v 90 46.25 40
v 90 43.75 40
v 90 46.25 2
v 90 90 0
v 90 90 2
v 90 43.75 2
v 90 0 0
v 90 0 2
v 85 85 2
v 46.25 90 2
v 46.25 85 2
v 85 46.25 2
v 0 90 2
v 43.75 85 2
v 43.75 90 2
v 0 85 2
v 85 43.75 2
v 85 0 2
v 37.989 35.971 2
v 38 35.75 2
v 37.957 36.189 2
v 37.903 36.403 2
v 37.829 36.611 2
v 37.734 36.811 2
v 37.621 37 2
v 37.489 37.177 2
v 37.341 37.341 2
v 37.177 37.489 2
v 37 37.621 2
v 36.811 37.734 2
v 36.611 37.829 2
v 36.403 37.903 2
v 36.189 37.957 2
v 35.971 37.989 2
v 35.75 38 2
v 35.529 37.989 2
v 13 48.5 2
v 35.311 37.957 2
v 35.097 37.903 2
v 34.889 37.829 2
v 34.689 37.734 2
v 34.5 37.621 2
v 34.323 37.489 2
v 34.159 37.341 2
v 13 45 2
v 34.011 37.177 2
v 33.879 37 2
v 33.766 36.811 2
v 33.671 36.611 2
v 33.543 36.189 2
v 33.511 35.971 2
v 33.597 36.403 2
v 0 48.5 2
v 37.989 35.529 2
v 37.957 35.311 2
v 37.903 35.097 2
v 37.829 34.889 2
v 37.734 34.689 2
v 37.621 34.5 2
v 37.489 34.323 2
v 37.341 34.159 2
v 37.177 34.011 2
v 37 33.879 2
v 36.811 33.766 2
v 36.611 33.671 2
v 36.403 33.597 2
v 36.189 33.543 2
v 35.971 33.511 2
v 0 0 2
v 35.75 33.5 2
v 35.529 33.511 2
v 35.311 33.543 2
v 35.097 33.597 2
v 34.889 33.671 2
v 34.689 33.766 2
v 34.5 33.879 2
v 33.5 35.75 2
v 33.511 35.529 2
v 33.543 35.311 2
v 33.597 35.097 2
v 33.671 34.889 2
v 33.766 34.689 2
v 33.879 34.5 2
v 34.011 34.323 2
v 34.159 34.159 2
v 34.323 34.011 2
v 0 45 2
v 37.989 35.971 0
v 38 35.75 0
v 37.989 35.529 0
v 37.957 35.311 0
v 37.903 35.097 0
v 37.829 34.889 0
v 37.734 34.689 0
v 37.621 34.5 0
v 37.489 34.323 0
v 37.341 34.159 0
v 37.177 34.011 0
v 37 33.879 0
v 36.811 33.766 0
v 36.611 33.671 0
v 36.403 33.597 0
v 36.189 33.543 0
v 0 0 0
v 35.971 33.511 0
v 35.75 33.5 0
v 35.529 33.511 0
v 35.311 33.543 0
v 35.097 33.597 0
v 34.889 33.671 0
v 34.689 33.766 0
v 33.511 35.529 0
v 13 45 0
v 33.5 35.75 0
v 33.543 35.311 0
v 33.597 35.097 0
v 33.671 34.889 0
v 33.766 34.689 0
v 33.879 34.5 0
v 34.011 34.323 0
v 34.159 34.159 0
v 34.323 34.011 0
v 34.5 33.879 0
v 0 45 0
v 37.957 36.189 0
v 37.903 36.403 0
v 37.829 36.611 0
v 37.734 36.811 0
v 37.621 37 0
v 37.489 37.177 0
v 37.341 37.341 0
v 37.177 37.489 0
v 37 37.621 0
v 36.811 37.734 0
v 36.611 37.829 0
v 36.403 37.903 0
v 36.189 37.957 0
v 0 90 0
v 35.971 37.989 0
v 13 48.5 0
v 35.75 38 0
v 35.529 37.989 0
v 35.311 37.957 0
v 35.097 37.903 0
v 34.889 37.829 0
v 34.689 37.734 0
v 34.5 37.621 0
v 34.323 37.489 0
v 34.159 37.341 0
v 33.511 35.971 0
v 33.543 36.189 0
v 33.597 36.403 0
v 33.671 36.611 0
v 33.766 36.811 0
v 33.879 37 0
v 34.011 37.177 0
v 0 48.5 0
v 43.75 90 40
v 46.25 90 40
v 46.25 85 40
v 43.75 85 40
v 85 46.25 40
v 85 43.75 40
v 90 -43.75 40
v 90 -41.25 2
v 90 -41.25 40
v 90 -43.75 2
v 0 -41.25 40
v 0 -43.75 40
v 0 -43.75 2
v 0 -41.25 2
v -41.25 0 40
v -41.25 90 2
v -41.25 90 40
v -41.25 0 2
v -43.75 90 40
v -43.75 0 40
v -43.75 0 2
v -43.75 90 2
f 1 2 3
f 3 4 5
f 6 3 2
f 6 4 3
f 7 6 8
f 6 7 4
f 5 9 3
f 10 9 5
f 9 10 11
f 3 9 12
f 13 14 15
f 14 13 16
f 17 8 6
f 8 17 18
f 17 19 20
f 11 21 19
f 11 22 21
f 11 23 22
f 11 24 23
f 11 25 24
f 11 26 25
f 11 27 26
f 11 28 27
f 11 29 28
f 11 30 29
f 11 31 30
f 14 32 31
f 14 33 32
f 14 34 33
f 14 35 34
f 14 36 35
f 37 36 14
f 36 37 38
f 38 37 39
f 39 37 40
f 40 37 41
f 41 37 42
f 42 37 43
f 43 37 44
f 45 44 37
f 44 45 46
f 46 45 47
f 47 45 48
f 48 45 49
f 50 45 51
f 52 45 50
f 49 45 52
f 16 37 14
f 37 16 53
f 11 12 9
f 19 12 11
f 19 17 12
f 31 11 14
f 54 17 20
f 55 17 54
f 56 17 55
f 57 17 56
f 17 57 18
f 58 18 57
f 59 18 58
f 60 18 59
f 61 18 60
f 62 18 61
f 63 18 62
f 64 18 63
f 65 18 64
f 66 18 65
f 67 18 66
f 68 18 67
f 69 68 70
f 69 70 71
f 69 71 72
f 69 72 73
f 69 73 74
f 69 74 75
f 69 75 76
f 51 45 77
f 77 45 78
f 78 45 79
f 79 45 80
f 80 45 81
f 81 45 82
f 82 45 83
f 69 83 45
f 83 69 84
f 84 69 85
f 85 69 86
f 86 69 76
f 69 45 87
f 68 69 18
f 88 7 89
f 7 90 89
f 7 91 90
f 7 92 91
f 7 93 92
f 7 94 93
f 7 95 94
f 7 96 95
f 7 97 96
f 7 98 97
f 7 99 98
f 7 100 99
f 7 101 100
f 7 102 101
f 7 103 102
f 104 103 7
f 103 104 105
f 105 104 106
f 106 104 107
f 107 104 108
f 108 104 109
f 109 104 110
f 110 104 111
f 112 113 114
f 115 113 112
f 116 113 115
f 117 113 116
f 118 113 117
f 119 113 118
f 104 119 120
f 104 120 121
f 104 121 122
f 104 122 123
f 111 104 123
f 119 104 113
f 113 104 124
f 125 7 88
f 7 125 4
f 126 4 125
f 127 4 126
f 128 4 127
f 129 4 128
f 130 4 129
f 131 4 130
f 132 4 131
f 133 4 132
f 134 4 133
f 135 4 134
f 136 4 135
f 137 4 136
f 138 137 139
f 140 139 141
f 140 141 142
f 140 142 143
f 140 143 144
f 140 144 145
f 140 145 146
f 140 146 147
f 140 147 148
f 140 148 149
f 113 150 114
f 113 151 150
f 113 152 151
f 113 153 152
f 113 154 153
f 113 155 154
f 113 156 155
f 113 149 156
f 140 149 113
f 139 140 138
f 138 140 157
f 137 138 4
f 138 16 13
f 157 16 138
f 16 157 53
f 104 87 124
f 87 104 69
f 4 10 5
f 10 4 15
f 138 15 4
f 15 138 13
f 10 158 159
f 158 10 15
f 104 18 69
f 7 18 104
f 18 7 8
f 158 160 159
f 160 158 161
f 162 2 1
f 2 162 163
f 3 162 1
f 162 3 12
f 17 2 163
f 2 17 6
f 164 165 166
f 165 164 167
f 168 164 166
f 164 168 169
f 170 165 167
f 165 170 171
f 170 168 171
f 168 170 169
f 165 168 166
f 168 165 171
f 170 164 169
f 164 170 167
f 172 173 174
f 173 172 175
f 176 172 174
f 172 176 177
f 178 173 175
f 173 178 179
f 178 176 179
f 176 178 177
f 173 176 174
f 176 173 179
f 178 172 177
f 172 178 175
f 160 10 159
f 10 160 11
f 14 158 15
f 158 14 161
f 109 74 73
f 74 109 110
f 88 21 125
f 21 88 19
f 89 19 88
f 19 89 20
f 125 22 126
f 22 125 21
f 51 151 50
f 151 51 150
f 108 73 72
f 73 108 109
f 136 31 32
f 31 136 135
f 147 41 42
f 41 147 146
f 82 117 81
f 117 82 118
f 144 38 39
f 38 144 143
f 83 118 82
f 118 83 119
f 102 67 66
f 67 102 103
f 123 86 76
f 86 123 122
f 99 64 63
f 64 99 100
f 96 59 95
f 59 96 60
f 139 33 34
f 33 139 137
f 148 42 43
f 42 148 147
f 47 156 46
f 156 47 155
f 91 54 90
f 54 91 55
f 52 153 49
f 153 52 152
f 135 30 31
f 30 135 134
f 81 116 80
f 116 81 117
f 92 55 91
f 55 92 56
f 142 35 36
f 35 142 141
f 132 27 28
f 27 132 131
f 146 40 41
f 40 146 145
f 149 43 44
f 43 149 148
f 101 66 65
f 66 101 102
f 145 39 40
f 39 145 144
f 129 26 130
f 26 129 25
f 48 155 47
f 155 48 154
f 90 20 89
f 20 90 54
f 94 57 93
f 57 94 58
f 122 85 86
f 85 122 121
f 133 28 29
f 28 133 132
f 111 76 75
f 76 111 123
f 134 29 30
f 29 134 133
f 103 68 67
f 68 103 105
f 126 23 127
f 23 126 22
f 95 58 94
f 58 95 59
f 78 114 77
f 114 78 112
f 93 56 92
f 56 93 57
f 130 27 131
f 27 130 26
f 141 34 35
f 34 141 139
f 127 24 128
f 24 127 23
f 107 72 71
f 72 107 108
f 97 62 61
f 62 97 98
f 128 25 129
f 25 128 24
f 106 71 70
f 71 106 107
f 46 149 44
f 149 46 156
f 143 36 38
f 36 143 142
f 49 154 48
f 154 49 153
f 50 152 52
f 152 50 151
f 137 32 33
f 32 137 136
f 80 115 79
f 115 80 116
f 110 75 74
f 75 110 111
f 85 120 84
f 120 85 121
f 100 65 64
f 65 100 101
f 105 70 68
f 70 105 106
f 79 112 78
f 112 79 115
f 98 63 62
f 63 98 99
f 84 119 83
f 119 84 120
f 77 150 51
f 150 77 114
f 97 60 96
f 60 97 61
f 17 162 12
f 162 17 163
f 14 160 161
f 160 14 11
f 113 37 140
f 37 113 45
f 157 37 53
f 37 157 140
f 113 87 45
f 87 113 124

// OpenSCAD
// Dimensions for DIY Magnetic Stirrer Housing
// Based on 80mm PC fan, printed upside down

// Overall outer dimensions
OUT_X = 90;       // X width in mm
OUT_Y = 90;       // Y depth in mm

// Wall thickness
WALL_THICK = 2.5; // Wall thickness in mm

// Top plate thickness (on the bed, z=0 to 2)
TOP_THICK = 2;    // Top plate thickness in mm

// Total height of the box walls
BOX_HEIGHT = 40;  // Height of walls from top plate to open edge

// Fan mounting holes
FAN_HOLE_DIA = 4.5; // Diameter of M4 screw holes
FAN_PITCH = 71.5;   // Distance between hole centres (square pattern)

// Cable notch dimensions
NOTCH_WIDTH = 12;   // Width of the notch in X direction
NOTCH_DEPTH = 8;    // Depth of the notch from the open edge (z=32 to z=40)
// Assuming notch is on the wall at Y = OUT_Y/2 (front wall)

// Helper variables
INNER_X = OUT_X - 2 * WALL_THICK;
INNER_Y = OUT_Y - 2 * WALL_THICK;

// Hole positions for the 4 mounting holes
// Centred on the plate. Plate is OUT_X x OUT_Y.
// Pattern is FAN_PITCH x FAN_PITCH.
// Offsets from center:
HALF_PITCH = FAN_PITCH / 2;

// Notch parameters
NOTCH_Z_START = BOX_HEIGHT - NOTCH_DEPTH; // z = 32
NOTCH_Z_END = BOX_HEIGHT;                 // z = 40

// Build the part
difference() {
    // Main box body
    union() {
        // Bottom plate (z=0 to z=TOP_THICK)
        cube([OUT_X, OUT_Y, TOP_THICK], center=false);
        
        // Walls (z=TOP_THICK to z=BOX_HEIGHT)
        // Front wall (Y = OUT_Y/2)
        translate([0, OUT_Y/2 - WALL_THICK/2, TOP_THICK])
            cube([OUT_X, WALL_THICK, BOX_HEIGHT - TOP_THICK], center=false);
            
        // Back wall (Y = -OUT_Y/2)
        translate([0, -OUT_Y/2 + WALL_THICK/2, TOP_THICK])
            cube([OUT_X, WALL_THICK, BOX_HEIGHT - TOP_THICK], center=false);
            
        // Left wall (X = -OUT_X/2)
        translate([-OUT_X/2 + WALL_THICK/2, 0, TOP_THICK])
            cube([WALL_THICK, OUT_Y, BOX_HEIGHT - TOP_THICK], center=false);
            
        // Right wall (X = OUT_X/2)
        translate([OUT_X/2 - WALL_THICK/2, 0, TOP_THICK])
            cube([WALL_THICK, OUT_Y, BOX_HEIGHT - TOP_THICK], center=false);
    }

    // 2. Subtract the inner void to make it hollow
    // Inner void starts at z=TOP_THICK, goes up to BOX_HEIGHT
    // Inner dimensions are INNER_X x INNER_Y
    translate([0, 0, TOP_THICK])
        cube([INNER_X, INNER_Y, BOX_HEIGHT - TOP_THICK + 0.01], center=false);

    // 3. Drill the 4 mounting holes through the top plate
    // Holes go from z=0 through the top plate to z=TOP_THICK
    // They should extend slightly into the inner void or just through the plate.
    // Rule: extend 0.01-1mm past faces. 
    // Let's extend them slightly into the void (z > TOP_THICK) to ensure clean cut.
    hole_extend = 0.5;
    for (x = [-HALF_PITCH, HALF_PITCH]) {
        for (y = [-HALF_PITCH, HALF_PITCH]) {
            translate([x, y, -0.01]) // Start slightly below z=0
            {
                $fn = 64;
                cylinder(d = FAN_HOLE_DIA, h = TOP_THICK + hole_extend, center=false);
            }
        }
    }

    // 4. Cut the cable notch in one wall
    // Notch is on the wall at Y = OUT_Y/2 (Front wall)
    // Width 12mm in X, centred (X from -6 to 6)
    // Depth 8mm from open edge (z=32 to z=40)
    // It cuts through the wall thickness.
    
    // The wall is at Y = OUT_Y/2. The material exists from Y = OUT_Y/2 - WALL_THICK to Y = OUT_Y/2.
    // We need to remove material in the notch area.
    
    // Notch X range: -NOTCH_WIDTH/2 to NOTCH_WIDTH/2
    // Notch Y range: OUT_Y/2 - WALL_THICK to OUT_Y/2 (full wall thickness)
    // Notch Z range: NOTCH_Z_START to NOTCH_Z_END
    
    // To ensure clean cutting, we extend slightly past the Z bounds and Y bounds
    notch_x_ext = 1;
    notch_y_ext = 1;
    notch_z_ext = 0.5;
    
    translate([0, OUT_Y/2, 0])
        cube([NOTCH_WIDTH + notch_x_ext, WALL_THICK + notch_y_ext, NOTCH_DEPTH + notch_z_ext], center=false);
}
